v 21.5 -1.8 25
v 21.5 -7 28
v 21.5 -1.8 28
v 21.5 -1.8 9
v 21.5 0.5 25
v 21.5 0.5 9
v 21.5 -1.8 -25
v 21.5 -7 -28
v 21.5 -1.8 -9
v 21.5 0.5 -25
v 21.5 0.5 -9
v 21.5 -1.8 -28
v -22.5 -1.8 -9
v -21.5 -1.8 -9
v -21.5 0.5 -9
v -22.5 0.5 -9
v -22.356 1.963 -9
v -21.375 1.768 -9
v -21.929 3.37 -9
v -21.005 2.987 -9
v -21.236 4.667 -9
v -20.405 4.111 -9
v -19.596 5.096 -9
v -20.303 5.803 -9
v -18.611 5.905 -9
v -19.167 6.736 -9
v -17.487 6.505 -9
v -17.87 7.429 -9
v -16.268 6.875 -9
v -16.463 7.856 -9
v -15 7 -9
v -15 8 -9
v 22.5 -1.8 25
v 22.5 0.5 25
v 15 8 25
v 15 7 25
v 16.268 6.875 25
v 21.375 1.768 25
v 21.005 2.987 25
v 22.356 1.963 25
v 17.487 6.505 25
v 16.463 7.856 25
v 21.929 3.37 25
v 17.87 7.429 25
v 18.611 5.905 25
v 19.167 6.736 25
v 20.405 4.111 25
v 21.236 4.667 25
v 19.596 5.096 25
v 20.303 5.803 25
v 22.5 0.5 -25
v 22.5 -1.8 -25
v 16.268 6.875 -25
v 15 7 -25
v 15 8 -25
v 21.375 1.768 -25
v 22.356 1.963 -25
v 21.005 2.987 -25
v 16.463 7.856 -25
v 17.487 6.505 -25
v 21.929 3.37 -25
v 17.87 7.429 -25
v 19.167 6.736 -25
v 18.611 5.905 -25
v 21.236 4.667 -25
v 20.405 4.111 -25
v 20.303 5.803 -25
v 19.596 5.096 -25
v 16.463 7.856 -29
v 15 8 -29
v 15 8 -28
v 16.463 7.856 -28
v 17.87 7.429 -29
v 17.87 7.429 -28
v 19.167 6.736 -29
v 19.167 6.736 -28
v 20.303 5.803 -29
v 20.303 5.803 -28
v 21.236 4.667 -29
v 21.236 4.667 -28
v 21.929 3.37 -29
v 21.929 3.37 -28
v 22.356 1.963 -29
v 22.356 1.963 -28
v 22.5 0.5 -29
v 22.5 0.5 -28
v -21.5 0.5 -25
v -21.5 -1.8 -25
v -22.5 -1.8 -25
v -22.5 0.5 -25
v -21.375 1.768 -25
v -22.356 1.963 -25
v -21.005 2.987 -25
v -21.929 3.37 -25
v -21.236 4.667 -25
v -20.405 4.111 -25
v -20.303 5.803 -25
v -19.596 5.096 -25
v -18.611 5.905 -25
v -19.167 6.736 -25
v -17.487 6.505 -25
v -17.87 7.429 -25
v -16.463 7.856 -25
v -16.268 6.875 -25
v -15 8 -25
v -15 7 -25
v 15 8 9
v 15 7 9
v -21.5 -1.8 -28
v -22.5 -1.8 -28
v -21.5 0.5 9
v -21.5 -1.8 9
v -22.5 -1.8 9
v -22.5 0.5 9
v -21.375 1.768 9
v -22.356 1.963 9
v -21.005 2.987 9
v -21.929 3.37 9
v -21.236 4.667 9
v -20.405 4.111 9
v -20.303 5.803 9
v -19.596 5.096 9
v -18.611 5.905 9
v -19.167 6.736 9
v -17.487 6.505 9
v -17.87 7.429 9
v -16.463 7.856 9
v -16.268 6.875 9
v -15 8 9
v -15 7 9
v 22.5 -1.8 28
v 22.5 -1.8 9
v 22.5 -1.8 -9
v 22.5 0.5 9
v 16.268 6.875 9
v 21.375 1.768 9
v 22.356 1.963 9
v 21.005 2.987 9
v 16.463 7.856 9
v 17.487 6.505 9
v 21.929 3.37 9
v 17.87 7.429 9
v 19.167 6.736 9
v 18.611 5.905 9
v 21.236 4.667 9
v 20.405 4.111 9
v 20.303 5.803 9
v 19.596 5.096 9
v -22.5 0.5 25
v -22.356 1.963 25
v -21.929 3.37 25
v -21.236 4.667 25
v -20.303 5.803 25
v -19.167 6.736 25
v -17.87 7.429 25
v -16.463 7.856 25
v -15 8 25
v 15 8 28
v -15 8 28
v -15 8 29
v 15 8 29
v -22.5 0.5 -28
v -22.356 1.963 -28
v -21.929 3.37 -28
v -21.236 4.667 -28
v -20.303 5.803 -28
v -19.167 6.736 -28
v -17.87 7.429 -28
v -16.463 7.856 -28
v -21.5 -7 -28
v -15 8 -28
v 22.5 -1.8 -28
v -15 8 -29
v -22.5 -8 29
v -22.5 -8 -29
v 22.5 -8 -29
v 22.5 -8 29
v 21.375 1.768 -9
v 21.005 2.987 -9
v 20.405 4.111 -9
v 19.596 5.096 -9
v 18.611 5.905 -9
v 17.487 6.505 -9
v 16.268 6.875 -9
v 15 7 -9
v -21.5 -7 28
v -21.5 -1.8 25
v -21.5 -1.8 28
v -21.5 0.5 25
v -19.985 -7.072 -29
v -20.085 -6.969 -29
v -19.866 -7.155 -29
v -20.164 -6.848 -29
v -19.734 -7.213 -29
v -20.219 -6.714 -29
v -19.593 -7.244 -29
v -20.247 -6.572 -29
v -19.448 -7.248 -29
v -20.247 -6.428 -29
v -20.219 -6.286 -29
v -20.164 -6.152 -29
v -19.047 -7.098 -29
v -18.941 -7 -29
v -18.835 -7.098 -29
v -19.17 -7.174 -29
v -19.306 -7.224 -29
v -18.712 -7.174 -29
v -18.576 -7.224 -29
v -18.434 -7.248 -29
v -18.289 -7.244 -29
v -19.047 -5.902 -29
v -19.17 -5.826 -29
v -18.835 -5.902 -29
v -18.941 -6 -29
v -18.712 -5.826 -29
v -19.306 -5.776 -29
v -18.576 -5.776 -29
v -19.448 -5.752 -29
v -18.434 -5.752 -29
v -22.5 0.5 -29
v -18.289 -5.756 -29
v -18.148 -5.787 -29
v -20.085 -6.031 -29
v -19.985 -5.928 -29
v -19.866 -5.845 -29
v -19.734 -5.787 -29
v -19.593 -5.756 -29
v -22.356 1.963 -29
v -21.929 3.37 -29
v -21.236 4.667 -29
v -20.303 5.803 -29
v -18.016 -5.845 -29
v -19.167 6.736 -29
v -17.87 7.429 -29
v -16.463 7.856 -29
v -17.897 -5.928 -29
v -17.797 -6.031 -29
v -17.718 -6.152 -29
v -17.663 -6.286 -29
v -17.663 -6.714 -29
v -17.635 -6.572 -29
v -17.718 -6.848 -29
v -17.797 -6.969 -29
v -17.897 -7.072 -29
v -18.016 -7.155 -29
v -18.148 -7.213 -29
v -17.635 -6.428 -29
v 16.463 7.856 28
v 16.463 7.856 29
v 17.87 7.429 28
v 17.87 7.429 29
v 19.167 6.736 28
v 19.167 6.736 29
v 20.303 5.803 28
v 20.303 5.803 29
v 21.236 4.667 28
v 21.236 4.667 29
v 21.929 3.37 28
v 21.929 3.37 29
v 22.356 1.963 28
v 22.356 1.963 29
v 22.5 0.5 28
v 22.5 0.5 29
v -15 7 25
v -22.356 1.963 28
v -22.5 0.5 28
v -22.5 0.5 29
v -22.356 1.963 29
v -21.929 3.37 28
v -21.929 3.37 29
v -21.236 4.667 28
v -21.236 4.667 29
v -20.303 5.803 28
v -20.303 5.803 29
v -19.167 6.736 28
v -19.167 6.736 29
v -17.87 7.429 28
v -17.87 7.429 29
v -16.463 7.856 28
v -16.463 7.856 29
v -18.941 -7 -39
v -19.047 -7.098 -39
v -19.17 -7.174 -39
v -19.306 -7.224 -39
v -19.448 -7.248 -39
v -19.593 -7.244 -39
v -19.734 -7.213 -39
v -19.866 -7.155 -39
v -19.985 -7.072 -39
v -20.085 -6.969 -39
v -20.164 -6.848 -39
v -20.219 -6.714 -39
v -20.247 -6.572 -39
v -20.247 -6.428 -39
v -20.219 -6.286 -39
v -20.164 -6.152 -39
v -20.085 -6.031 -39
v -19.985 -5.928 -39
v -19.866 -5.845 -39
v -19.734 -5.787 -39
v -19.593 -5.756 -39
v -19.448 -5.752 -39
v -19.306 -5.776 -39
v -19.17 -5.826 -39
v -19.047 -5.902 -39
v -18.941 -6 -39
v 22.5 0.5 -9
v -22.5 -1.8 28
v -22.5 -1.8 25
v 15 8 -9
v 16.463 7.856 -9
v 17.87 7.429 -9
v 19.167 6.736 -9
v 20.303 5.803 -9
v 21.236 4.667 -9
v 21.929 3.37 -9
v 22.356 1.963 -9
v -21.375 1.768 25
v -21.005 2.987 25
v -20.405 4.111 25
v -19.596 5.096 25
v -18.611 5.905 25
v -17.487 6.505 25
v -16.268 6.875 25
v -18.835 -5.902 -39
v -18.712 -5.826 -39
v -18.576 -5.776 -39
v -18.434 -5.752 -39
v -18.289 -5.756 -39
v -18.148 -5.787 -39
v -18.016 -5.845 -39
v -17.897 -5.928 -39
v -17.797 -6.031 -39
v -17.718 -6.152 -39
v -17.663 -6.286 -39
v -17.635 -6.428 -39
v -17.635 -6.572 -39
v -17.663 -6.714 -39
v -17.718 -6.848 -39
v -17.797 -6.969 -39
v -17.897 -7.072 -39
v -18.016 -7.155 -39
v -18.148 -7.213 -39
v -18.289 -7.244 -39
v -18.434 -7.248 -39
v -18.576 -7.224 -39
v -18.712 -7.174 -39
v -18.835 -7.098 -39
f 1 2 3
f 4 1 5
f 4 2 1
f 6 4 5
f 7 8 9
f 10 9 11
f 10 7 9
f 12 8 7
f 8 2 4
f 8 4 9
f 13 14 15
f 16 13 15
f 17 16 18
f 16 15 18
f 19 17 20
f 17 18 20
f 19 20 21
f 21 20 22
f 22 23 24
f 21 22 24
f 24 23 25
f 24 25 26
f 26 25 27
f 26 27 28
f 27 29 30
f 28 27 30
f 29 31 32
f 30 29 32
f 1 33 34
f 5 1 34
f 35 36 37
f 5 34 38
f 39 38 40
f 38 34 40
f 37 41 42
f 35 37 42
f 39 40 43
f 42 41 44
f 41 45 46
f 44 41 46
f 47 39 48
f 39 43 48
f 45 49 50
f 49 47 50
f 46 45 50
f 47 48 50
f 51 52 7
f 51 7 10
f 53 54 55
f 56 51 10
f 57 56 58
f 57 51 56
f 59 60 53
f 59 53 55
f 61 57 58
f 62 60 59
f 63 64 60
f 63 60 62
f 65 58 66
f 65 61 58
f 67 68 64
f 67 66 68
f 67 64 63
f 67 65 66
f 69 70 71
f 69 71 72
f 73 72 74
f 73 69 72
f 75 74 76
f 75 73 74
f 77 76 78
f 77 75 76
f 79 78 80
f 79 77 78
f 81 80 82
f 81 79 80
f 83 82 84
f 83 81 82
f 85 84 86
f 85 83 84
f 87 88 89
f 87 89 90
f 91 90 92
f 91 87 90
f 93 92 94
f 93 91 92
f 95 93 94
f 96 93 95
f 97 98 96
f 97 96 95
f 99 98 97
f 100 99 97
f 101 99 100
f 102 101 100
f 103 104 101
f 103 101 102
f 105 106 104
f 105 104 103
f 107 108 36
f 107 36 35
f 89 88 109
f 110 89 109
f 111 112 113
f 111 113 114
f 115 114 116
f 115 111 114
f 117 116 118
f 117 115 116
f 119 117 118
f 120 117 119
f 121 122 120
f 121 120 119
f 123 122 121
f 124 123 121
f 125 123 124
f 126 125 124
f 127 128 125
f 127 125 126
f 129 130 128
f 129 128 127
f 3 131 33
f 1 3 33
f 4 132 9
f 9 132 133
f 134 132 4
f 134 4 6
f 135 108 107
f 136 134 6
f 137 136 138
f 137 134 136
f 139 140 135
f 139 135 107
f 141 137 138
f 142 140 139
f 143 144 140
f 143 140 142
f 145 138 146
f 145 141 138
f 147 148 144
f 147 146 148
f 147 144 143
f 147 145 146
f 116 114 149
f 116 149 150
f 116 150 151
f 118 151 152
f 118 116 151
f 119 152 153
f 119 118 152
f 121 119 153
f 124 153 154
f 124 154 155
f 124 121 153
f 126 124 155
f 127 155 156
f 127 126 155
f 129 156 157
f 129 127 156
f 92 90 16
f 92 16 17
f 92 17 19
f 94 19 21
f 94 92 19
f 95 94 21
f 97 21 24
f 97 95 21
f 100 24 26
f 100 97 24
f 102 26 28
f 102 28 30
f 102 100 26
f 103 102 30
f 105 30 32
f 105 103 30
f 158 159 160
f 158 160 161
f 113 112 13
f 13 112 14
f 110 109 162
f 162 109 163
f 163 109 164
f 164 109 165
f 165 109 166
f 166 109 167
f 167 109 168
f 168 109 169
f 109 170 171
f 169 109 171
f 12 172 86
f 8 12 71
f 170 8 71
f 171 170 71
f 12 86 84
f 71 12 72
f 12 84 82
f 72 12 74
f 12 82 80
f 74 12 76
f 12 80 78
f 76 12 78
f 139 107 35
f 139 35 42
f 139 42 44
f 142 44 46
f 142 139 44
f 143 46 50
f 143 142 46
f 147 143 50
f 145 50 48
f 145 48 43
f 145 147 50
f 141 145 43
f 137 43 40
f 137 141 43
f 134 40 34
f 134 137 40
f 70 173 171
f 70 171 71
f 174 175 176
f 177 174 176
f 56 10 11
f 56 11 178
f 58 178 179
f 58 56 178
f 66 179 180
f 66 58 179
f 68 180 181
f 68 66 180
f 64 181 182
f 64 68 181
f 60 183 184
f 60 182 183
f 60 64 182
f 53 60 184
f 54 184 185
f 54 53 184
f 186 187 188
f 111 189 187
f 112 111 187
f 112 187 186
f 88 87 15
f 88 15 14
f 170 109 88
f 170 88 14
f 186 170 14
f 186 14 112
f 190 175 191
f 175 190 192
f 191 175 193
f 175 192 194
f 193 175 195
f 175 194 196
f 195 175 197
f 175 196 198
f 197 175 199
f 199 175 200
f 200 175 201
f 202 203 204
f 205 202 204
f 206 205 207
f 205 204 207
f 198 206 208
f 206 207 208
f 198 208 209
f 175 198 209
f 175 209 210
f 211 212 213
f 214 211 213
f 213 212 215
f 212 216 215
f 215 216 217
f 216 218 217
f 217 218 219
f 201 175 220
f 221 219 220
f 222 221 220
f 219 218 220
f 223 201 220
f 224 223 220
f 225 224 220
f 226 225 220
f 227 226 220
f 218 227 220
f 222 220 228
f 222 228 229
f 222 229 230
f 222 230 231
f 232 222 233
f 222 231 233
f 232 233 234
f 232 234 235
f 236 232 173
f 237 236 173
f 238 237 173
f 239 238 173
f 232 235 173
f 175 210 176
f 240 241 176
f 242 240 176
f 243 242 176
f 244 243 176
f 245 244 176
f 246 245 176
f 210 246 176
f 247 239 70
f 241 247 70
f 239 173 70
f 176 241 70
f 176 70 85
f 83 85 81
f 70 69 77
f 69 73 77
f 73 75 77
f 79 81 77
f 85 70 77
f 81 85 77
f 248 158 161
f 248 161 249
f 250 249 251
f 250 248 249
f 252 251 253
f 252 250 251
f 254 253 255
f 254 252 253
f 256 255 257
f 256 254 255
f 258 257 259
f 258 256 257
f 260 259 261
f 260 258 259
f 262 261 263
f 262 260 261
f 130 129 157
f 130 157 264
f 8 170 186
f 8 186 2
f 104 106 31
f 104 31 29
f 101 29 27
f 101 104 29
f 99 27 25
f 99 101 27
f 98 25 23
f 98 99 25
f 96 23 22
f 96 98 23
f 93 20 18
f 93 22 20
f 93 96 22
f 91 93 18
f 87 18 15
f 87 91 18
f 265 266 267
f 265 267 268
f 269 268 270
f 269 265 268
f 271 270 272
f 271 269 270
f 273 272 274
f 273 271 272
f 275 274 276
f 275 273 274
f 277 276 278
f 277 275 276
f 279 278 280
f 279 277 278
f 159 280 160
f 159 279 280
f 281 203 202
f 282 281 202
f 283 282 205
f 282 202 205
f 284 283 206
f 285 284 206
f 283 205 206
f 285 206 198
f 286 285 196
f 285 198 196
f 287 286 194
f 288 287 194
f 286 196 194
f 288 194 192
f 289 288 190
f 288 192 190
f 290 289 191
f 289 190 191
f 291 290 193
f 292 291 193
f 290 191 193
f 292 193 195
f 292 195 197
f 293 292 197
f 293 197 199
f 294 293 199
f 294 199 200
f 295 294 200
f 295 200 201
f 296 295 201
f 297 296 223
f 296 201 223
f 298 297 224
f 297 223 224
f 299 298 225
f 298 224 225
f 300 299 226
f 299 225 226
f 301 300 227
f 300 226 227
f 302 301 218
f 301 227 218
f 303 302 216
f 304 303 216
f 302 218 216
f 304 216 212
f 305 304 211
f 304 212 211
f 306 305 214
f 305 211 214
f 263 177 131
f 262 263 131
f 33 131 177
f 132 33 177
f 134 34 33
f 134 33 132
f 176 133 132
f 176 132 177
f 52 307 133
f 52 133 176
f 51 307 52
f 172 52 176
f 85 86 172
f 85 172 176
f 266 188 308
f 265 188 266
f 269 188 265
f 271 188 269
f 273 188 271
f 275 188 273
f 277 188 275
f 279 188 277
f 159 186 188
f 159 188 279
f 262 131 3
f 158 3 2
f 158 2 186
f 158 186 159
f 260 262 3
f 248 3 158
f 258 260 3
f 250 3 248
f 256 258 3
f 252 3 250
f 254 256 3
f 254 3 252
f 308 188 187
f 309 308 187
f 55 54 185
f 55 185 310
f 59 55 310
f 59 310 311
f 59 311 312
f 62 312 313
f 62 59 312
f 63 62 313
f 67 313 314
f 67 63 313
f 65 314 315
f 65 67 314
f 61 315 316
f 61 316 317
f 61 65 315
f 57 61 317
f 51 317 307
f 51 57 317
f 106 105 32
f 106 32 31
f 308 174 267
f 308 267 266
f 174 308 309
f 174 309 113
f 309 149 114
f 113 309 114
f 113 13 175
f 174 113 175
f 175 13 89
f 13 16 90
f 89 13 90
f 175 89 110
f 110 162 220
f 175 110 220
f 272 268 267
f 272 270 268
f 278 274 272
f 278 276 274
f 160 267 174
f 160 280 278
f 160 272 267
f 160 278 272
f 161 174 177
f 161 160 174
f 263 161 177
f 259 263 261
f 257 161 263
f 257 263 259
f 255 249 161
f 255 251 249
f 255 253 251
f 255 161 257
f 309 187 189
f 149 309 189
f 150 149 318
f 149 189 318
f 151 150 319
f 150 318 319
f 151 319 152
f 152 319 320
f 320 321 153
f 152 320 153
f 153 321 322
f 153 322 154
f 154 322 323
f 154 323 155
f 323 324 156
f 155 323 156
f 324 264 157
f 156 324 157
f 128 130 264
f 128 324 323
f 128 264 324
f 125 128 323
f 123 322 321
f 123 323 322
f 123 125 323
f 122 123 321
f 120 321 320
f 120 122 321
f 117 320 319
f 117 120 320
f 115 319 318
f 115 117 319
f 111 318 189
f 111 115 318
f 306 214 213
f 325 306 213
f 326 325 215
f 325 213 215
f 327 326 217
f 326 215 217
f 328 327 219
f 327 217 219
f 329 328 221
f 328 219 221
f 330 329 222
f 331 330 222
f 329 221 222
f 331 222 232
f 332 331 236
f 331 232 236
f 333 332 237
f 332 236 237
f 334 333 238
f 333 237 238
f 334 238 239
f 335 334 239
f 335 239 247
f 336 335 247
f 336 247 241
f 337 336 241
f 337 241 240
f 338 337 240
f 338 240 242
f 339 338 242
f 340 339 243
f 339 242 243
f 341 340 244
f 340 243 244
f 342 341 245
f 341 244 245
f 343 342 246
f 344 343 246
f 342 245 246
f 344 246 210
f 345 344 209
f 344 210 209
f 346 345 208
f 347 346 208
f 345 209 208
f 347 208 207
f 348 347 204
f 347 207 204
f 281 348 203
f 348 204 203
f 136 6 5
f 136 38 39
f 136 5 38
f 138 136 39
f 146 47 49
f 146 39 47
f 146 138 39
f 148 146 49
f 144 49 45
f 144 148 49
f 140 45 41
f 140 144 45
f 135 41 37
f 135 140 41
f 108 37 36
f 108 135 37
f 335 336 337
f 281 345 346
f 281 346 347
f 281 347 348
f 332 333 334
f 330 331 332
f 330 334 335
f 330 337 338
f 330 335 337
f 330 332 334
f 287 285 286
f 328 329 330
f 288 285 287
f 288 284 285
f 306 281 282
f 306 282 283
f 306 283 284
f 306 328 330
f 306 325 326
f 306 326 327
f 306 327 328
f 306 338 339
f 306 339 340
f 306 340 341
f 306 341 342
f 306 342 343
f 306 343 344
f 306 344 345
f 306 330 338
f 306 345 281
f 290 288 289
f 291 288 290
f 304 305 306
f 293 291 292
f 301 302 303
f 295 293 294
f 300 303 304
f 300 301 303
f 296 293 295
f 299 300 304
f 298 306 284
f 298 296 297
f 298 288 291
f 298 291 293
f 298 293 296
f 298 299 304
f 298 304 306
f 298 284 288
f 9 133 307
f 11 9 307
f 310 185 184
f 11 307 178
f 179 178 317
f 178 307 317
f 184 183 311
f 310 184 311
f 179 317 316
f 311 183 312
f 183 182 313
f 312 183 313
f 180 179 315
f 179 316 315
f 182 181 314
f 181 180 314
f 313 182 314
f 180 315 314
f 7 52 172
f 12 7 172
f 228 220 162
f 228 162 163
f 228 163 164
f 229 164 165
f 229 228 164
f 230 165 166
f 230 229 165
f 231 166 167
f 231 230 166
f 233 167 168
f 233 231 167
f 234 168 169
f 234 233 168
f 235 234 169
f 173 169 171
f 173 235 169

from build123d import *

# Parameters (mm, degrees)
SKETCH1_W           = 45
SKETCH1_H           = 58
BOSS_EXTRUDE1_DEPTH = 8
FILLET1_R           = 7.5
SHELL1_START        = -28
SHELL1_DEPTH        = 56
SKETCH2_W           = 18
SKETCH2_H           = 15
SKETCH2_W_2         = 3
CUT_EXTRUDE1_DEPTH  = 55.129474411
BOSS_EXTRUDE2_DEPTH = 10


# Read off the part's stored shape, not the designer's step: Shell1
with BuildPart() as part:
    # Sketch1 → Boss-Extrude1 (new, symmetric)
    with BuildSketch(Plane(origin=(0, 0, 0), x_dir=(1, 0, 0), z_dir=(0, 1, 0))):
        Rectangle(SKETCH1_W, SKETCH1_H)
    extrude(amount=BOSS_EXTRUDE1_DEPTH, both=True)

    # Fillet1
    fillet1_edges = [part.edges().sort_by_distance(p)[0] for p in [
        (22.5, 8, 0),
        (-22.5, 8, 0),
    ]]
    fillet(fillet1_edges, radius=FILLET1_R)

    # Shell1 outline → Shell1 (cut)
    with BuildSketch(Plane.XY.offset(SHELL1_START)):
        with BuildLine():
            ThreePointArc((21.5, 0.5), (19.596194078, 5.096194078), (15, 7))
            Line((15, 7), (15, 8))
            Line((15, 8), (-15, 8))
            Line((-15, 8), (-15, 7))
            ThreePointArc((-15, 7), (-19.596194078, 5.096194078), (-21.5, 0.5))
            Line((-21.5, 0.5), (-21.5, -7))
            Line((-21.5, -7), (21.5, -7))
            Line((21.5, -7), (21.5, 0.5))
        make_face()
    extrude(amount=SHELL1_DEPTH, mode=Mode.SUBTRACT)

    # Sketch2 → Cut-Extrude1 (cut, through all)
    with BuildSketch(Plane(origin=(22.5, 0, 0), x_dir=(0, 0, -1), z_dir=(1, 0, 0))):
        with Locations((0, 5.7)):
            Rectangle(SKETCH2_W, SKETCH2_H)
        with Locations((-26.5, 5.7)):
            Rectangle(SKETCH2_W_2, SKETCH2_H)
        with Locations((26.5, 5.7)):
            Rectangle(SKETCH2_W_2, SKETCH2_H)
    extrude(amount=-CUT_EXTRUDE1_DEPTH, mode=Mode.SUBTRACT)

    # Sketch3 → Boss-Extrude2 (add)
    with BuildSketch(Plane(origin=(0, 0, -29), x_dir=(-1, 0, 0), z_dir=(0, 0, -1))):
        with BuildLine():
            ThreePointArc((18.940983006, -7), (20.25, -6.5), (18.940983006, -6))
            ThreePointArc((18.940983006, -6), (17.631966011, -6.5), (18.940983006, -7))
        make_face()
    extrude(amount=BOSS_EXTRUDE2_DEPTH)


solid = part.part
